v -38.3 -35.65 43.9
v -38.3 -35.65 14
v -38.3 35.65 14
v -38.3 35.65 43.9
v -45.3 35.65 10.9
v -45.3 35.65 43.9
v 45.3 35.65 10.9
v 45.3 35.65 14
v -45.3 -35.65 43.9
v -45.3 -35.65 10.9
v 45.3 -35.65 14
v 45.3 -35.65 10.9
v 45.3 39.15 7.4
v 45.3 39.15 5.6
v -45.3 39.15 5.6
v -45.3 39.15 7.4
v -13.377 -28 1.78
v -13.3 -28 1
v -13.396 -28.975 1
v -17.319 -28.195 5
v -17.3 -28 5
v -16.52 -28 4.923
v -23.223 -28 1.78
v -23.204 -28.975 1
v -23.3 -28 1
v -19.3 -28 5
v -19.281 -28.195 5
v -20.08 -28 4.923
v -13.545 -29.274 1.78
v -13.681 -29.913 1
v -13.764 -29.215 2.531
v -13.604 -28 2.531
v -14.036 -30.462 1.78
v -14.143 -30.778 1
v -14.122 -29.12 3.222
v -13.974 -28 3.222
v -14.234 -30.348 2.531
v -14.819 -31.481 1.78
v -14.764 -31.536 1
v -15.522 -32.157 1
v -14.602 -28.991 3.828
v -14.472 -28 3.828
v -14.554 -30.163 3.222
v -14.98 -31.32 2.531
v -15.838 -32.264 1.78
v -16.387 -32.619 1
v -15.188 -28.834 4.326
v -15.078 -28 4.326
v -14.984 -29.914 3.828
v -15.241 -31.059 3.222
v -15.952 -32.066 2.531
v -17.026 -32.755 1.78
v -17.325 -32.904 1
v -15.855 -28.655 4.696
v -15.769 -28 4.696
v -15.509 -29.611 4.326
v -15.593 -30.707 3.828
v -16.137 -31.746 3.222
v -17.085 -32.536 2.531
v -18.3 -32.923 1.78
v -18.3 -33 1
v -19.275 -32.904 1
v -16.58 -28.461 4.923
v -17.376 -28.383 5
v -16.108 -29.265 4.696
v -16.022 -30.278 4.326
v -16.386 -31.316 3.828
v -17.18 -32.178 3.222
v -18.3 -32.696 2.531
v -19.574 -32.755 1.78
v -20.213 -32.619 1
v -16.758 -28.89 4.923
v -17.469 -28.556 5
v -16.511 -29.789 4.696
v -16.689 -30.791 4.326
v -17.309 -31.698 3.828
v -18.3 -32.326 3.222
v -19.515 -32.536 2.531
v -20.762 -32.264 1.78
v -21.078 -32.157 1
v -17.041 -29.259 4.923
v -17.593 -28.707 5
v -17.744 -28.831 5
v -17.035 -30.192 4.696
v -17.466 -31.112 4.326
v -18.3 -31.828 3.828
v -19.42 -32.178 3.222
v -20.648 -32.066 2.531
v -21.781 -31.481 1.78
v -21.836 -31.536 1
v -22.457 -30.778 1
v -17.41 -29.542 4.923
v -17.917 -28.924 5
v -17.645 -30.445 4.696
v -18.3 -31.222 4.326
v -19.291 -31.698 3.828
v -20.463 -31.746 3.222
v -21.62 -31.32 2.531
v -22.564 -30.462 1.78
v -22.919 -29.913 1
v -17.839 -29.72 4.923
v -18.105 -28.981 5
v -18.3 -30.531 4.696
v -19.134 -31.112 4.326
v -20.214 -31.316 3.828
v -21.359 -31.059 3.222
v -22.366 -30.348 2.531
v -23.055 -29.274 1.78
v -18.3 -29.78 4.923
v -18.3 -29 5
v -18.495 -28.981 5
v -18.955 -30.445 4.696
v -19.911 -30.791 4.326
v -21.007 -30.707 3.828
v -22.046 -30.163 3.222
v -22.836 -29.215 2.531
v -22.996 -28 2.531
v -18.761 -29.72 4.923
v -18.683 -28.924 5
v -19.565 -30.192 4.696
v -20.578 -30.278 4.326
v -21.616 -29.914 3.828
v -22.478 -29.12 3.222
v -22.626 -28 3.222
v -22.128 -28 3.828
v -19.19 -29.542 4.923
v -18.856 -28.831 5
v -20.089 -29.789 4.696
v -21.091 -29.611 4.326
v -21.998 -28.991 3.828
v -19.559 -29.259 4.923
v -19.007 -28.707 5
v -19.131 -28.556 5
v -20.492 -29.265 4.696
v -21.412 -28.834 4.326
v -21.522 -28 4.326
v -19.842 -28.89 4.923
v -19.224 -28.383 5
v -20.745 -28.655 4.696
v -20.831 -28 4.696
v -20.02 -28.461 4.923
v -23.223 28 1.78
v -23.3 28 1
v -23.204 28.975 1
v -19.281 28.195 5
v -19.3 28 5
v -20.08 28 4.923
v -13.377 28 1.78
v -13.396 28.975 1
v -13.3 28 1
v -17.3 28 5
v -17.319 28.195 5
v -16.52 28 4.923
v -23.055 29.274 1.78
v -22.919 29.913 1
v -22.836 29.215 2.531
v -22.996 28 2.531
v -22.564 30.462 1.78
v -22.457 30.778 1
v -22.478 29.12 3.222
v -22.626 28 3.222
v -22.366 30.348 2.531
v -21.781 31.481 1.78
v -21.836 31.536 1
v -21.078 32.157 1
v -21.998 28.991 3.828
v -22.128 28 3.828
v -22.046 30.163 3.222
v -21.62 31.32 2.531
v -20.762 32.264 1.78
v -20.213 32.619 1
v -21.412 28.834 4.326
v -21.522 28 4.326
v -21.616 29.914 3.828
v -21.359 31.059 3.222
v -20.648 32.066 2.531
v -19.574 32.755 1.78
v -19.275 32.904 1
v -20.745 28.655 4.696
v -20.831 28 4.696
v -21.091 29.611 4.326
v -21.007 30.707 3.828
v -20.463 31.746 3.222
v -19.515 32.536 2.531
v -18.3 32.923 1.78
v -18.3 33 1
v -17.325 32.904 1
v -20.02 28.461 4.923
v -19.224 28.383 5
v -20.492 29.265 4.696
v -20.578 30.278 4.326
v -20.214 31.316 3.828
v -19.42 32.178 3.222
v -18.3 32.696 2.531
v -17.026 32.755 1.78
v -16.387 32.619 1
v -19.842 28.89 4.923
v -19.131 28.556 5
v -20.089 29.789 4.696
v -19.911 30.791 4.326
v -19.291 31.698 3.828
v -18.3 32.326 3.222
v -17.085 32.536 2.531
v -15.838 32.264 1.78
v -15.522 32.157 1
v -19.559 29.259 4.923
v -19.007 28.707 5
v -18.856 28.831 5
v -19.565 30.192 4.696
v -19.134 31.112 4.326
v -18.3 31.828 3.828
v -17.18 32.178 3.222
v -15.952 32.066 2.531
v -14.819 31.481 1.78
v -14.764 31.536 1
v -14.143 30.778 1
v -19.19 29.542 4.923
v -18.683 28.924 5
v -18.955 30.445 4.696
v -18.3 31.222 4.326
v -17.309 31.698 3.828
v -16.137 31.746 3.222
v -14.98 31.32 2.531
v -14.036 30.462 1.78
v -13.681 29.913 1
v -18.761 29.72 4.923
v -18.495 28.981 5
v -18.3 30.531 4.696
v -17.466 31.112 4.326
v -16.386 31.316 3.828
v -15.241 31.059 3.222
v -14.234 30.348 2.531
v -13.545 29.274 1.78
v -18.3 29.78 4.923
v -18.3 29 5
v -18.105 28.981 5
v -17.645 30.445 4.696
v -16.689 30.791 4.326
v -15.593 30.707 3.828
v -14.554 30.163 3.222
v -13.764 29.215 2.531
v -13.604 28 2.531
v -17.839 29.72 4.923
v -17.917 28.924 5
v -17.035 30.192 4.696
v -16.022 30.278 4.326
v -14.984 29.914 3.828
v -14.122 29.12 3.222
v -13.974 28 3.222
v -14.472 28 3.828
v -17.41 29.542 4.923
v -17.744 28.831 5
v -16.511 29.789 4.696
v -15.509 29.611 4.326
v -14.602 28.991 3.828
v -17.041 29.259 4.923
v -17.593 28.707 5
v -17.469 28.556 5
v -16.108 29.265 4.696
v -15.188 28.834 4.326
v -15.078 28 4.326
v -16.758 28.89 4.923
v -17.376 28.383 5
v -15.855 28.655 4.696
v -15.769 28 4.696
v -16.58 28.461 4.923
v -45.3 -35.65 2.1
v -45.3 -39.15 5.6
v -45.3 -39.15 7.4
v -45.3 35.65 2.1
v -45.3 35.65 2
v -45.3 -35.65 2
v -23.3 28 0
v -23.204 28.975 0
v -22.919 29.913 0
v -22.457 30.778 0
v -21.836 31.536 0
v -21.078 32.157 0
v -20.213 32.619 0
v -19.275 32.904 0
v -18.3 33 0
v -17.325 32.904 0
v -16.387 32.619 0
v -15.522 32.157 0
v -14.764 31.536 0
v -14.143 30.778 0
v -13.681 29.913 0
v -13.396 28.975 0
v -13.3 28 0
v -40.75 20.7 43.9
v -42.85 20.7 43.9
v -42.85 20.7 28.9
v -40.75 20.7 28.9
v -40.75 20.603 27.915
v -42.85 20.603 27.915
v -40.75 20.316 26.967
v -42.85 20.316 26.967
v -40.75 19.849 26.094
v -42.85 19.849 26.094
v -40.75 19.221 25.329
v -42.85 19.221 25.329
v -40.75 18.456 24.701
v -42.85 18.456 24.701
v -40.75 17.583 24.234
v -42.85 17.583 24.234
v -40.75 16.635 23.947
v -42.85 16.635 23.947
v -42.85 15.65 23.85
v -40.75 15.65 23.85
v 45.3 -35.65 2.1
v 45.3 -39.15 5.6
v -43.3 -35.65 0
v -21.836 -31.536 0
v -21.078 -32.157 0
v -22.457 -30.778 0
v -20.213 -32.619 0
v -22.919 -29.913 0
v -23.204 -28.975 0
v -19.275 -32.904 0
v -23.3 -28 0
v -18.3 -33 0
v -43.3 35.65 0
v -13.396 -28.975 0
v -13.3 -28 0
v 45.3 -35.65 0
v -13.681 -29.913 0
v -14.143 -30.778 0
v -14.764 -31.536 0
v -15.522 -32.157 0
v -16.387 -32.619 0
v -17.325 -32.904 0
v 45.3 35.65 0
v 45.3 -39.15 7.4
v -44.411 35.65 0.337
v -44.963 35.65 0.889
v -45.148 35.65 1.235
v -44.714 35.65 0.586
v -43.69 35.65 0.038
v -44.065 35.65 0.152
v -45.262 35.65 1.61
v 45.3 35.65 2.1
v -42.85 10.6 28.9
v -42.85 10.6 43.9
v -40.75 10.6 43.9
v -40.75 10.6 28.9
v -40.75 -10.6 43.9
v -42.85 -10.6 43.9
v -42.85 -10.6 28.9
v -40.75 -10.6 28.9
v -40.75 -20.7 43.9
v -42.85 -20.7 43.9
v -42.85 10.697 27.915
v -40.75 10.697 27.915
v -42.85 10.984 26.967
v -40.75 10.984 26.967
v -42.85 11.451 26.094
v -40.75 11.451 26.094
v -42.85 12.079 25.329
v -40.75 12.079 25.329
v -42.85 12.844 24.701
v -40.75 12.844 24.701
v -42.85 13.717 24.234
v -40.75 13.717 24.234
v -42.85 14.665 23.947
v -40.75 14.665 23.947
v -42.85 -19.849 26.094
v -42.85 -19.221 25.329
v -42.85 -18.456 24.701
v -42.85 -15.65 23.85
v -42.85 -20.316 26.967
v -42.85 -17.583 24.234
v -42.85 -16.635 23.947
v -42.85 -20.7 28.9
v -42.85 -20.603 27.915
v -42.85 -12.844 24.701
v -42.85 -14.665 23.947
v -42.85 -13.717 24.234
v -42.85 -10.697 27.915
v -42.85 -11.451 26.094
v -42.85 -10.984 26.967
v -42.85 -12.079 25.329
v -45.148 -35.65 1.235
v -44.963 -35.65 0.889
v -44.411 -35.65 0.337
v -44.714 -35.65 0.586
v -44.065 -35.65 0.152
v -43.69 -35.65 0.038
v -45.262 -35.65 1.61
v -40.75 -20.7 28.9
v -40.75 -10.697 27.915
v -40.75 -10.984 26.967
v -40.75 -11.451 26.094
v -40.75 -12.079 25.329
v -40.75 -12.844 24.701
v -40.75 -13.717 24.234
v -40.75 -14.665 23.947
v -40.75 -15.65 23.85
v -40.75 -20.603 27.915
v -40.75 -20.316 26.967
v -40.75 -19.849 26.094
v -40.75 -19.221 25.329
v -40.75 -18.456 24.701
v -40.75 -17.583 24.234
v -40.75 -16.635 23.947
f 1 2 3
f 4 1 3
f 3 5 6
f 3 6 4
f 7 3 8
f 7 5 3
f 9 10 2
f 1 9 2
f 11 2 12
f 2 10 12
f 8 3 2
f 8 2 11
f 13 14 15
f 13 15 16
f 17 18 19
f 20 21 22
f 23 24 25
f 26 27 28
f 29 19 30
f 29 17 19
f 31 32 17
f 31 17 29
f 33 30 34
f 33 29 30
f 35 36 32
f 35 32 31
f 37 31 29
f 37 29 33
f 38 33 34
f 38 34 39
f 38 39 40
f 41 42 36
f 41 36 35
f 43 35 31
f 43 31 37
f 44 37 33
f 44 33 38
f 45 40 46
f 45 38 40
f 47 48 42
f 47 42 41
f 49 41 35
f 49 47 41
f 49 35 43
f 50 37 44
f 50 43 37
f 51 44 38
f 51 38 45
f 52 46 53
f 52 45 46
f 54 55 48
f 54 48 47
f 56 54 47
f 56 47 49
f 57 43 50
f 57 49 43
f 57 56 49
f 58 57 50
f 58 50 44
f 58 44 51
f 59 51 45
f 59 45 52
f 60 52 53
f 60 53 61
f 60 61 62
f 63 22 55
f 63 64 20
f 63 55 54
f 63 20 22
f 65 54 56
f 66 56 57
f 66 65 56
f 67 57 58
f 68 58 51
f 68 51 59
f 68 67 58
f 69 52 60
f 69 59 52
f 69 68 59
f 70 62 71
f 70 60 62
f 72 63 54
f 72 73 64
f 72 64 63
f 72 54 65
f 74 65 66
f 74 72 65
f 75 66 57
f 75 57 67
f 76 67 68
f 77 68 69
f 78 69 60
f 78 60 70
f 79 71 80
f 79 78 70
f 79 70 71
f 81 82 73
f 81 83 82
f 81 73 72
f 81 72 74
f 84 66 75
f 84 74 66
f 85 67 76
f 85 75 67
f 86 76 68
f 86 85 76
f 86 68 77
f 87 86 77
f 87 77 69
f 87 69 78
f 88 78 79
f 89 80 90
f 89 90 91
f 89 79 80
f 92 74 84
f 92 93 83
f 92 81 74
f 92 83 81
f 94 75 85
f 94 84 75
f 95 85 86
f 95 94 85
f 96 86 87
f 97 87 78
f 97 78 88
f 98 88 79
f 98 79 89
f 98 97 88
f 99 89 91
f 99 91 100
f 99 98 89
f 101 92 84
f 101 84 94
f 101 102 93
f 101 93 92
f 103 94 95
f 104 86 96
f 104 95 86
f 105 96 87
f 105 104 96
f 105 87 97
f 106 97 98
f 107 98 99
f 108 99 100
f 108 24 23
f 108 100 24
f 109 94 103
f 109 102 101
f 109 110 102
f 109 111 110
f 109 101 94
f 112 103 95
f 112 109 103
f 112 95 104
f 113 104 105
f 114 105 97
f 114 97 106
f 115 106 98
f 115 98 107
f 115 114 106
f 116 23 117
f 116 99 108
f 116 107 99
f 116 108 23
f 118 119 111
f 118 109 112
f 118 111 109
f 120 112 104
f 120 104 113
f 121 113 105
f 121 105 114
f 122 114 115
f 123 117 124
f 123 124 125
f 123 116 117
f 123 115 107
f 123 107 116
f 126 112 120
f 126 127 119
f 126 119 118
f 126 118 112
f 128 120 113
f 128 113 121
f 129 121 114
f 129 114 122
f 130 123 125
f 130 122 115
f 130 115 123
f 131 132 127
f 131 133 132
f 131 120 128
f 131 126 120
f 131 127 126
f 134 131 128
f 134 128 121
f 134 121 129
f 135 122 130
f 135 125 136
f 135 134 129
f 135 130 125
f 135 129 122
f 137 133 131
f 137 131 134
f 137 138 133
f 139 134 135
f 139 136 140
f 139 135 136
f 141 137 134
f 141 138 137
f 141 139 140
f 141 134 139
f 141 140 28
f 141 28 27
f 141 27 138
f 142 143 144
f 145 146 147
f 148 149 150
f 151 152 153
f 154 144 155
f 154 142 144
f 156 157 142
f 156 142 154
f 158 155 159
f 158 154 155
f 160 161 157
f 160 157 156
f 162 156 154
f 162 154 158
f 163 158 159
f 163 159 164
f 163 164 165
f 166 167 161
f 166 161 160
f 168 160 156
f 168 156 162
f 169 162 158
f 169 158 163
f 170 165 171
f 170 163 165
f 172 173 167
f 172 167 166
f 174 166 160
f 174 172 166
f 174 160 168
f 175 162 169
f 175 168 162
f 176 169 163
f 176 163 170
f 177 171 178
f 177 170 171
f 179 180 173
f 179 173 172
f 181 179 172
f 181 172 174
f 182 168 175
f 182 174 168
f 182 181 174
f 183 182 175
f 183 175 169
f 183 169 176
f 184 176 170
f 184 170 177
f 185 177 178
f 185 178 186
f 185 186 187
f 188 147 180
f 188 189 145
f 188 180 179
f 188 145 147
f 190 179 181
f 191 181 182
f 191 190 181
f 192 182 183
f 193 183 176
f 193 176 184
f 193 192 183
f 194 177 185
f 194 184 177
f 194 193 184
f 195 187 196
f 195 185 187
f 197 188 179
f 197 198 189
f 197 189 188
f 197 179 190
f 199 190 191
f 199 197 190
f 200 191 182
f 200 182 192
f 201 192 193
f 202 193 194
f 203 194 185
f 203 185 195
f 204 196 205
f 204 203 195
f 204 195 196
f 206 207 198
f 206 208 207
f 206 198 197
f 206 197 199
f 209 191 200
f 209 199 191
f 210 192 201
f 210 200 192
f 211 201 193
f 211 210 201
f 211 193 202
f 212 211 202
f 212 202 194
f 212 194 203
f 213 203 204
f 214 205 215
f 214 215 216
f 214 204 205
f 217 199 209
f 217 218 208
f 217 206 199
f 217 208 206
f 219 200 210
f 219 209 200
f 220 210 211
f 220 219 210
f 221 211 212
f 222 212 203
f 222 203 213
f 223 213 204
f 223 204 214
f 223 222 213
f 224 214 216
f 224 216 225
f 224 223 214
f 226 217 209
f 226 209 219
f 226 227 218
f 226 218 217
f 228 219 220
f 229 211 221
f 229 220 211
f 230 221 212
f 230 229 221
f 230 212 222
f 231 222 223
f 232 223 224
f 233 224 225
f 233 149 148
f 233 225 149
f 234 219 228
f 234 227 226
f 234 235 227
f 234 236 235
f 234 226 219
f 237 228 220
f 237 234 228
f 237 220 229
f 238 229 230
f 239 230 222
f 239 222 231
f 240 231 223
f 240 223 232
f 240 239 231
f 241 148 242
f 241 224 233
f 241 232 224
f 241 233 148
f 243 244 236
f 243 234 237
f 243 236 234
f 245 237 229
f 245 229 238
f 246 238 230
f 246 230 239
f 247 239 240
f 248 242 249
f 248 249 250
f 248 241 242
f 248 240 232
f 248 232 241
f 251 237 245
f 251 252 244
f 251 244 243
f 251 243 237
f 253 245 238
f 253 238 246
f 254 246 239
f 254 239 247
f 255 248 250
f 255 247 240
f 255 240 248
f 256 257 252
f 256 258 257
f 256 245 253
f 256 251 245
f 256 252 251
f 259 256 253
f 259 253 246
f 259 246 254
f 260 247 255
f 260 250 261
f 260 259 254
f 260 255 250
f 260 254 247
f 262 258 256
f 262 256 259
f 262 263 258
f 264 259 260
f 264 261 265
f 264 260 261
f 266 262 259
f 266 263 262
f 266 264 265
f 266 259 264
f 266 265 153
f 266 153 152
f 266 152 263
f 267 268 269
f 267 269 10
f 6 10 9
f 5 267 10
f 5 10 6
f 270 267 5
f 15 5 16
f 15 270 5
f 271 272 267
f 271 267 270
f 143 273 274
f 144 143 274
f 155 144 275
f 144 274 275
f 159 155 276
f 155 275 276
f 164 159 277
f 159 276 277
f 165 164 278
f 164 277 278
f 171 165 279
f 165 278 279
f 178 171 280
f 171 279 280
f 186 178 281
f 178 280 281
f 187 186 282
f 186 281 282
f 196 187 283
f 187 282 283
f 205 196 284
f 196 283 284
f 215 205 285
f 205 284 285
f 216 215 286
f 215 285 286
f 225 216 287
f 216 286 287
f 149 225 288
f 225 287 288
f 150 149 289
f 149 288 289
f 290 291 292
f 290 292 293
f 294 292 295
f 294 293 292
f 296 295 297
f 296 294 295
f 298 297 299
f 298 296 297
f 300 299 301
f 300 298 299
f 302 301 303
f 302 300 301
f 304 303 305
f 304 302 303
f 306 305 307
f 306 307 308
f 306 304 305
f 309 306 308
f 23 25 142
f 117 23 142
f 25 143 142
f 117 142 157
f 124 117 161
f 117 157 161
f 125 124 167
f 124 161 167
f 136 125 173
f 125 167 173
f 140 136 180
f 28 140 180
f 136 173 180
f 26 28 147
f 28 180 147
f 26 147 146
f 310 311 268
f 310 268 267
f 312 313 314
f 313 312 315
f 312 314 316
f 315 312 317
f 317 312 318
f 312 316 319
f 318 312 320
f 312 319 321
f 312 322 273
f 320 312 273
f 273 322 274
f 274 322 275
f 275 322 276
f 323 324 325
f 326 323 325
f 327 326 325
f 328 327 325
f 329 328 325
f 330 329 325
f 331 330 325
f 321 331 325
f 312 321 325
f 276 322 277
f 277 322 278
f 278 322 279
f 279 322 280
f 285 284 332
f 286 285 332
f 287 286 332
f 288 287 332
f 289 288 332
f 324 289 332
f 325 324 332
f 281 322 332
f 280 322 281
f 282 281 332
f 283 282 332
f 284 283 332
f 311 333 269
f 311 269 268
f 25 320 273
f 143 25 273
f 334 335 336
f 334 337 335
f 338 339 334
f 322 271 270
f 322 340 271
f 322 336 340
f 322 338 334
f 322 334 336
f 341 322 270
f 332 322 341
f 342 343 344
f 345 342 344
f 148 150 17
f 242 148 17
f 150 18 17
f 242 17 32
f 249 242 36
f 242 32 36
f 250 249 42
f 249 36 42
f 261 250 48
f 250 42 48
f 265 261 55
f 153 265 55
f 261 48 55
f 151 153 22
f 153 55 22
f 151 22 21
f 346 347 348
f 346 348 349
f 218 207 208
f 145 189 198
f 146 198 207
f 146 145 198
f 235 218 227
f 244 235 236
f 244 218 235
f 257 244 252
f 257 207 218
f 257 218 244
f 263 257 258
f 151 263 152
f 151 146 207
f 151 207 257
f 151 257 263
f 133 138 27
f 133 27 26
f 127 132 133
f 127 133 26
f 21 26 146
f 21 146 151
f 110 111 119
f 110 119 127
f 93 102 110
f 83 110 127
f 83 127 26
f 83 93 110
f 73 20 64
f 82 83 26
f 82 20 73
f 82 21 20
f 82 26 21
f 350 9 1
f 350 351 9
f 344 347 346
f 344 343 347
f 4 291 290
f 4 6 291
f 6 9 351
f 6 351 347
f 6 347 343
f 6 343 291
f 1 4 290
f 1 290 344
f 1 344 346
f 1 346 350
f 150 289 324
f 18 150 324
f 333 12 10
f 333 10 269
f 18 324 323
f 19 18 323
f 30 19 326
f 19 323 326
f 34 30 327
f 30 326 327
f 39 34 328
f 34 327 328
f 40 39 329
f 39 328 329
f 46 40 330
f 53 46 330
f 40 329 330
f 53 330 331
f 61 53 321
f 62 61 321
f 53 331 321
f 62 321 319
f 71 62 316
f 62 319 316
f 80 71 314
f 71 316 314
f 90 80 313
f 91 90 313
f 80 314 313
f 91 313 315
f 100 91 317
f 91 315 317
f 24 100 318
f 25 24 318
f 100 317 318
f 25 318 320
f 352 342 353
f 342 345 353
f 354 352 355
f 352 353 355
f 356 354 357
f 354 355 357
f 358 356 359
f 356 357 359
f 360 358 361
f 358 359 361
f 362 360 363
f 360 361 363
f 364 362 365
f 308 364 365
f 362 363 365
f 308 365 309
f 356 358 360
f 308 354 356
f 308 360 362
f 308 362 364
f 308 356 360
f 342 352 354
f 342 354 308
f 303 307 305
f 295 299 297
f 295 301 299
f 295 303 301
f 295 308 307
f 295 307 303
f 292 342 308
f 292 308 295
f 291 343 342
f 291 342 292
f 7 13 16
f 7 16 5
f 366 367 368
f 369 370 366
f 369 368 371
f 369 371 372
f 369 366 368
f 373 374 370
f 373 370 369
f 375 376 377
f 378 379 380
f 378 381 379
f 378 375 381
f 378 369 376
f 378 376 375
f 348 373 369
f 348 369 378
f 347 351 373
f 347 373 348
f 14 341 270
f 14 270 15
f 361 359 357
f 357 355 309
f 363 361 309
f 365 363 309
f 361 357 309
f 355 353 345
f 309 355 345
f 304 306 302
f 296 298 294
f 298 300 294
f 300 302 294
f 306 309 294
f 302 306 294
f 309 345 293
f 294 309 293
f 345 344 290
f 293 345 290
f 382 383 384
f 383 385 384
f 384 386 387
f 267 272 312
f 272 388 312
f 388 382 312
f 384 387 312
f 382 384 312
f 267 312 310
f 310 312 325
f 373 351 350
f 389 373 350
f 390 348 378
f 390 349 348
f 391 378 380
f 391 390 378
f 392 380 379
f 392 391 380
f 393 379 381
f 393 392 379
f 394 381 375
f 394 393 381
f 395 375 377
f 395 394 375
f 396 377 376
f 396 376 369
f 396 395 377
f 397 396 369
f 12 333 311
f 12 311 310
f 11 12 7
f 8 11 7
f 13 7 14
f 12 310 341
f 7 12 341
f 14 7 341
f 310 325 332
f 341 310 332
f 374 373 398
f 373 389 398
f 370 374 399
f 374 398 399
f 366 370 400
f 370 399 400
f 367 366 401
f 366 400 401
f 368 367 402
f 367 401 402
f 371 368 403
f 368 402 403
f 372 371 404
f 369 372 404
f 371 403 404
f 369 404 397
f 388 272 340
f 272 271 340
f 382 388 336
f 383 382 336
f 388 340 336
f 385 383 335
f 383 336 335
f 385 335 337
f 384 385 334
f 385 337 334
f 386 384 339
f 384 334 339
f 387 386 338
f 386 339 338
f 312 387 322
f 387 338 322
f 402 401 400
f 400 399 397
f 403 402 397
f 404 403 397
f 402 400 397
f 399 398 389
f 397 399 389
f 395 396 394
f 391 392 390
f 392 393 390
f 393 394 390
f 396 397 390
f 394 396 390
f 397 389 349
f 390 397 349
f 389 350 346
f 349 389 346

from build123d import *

# Parameters (mm, degrees)
F0_W      = 90.6
F0_H      = 71.3
F1_DEPTH  = 14
F2_W      = 7
F2_H      = 71.3
F3_DEPTH  = 29.9
F5_DEPTH  = 90.6
F7_W      = 2.1
F7_H      = 10.1
F8_DEPTH  = 20.05
F9_R      = 5.04999
F10_R     = 2
F12_DEPTH = 5
F13_R     = 4


# Not quite as in the source:
# - a fillet or chamfer is up to 0.001 mm smaller than in the source, because OpenCascade refuses the exact size


with BuildPart() as f1:
    # F0 (on Top) → F1 (new body)
    with BuildSketch(Plane.XY):
        Rectangle(F0_W, F0_H)
    extrude(amount=F1_DEPTH)

    # F2 (on face) → F3 (join)
    with BuildSketch(Plane.XY.offset(14)):
        with Locations((-41.8, 0)):
            Rectangle(F2_W, F2_H)
    extrude(amount=F3_DEPTH)


with BuildPart() as f5:
    # F4 (on face) → F5 (new body)
    with BuildSketch(Plane.YZ.offset(45.3)):
        Polygon((-39.15, 5.6), (-35.65, 2.1), (-35.65, 10.9), (-39.15, 7.4), align=None)
    extrude(amount=-F5_DEPTH)


with BuildPart() as f5b:
    # F4 (on face) → F5, piece 2 (new body)
    with BuildSketch(Plane.YZ.offset(45.3)):
        Polygon((35.65, 10.9), (35.65, 2.1), (39.15, 5.6), (39.15, 7.4), align=None)
    extrude(amount=-F5_DEPTH)


with BuildPart() as f5_1:
    add(f5.part)

    # F6: union F1, F5b
    add(f1.part)
    add(f5b.part)

    # F7 (on face) → F8 (cut)
    with BuildSketch(Plane.XY.offset(43.9)):
        with Locations((-41.8, -15.65)):
            Rectangle(F7_W, F7_H)
        with Locations((-41.8, 15.65)):
            Rectangle(F7_W, F7_H)
    extrude(amount=-F8_DEPTH, mode=Mode.SUBTRACT)

    # F9 (radius 5.05 in the source; OpenCascade refuses exactly that, so slightly less here)
    f9_edges = [f5_1.edges().sort_by_distance(p)[0] for p in [
        (-41.8, -20.7, 23.85),
        (-41.8, -10.6, 23.85),
        (-41.8, 20.7, 23.85),
        (-41.8, 10.6, 23.85),
    ]]
    fillet(f9_edges, radius=F9_R)

    # F10
    f10_edges = [f5_1.edges().sort_by_distance(p)[0] for p in [
        (-45.3, 0, 0),
    ]]
    fillet(f10_edges, radius=F10_R)

    # F11 (on face) → F12 (cut)
    with BuildSketch(Plane(origin=(0, 0, 0), x_dir=(1, 0, 0), z_dir=(0, 0, -1))):
        with BuildLine():
            Line((-23.3, 28), (-23.3, -28))
            ThreePointArc((-23.3, -28), (-18.3, -33), (-13.3, -28))
            Line((-13.3, -28), (-13.3, 28))
            ThreePointArc((-13.3, 28), (-18.3, 33), (-23.3, 28))
        make_face()
    extrude(amount=-F12_DEPTH, mode=Mode.SUBTRACT)

    # F13
    f13_edges = [f5_1.edges().sort_by_distance(p)[0] for p in [
        (-23.3, 0, 5),
        (-18.3, 33, 5),
        (-13.3, 0, 5),
        (-18.3, -33, 5),
    ]]
    fillet(f13_edges, radius=F13_R)


solid = f5_1.part
